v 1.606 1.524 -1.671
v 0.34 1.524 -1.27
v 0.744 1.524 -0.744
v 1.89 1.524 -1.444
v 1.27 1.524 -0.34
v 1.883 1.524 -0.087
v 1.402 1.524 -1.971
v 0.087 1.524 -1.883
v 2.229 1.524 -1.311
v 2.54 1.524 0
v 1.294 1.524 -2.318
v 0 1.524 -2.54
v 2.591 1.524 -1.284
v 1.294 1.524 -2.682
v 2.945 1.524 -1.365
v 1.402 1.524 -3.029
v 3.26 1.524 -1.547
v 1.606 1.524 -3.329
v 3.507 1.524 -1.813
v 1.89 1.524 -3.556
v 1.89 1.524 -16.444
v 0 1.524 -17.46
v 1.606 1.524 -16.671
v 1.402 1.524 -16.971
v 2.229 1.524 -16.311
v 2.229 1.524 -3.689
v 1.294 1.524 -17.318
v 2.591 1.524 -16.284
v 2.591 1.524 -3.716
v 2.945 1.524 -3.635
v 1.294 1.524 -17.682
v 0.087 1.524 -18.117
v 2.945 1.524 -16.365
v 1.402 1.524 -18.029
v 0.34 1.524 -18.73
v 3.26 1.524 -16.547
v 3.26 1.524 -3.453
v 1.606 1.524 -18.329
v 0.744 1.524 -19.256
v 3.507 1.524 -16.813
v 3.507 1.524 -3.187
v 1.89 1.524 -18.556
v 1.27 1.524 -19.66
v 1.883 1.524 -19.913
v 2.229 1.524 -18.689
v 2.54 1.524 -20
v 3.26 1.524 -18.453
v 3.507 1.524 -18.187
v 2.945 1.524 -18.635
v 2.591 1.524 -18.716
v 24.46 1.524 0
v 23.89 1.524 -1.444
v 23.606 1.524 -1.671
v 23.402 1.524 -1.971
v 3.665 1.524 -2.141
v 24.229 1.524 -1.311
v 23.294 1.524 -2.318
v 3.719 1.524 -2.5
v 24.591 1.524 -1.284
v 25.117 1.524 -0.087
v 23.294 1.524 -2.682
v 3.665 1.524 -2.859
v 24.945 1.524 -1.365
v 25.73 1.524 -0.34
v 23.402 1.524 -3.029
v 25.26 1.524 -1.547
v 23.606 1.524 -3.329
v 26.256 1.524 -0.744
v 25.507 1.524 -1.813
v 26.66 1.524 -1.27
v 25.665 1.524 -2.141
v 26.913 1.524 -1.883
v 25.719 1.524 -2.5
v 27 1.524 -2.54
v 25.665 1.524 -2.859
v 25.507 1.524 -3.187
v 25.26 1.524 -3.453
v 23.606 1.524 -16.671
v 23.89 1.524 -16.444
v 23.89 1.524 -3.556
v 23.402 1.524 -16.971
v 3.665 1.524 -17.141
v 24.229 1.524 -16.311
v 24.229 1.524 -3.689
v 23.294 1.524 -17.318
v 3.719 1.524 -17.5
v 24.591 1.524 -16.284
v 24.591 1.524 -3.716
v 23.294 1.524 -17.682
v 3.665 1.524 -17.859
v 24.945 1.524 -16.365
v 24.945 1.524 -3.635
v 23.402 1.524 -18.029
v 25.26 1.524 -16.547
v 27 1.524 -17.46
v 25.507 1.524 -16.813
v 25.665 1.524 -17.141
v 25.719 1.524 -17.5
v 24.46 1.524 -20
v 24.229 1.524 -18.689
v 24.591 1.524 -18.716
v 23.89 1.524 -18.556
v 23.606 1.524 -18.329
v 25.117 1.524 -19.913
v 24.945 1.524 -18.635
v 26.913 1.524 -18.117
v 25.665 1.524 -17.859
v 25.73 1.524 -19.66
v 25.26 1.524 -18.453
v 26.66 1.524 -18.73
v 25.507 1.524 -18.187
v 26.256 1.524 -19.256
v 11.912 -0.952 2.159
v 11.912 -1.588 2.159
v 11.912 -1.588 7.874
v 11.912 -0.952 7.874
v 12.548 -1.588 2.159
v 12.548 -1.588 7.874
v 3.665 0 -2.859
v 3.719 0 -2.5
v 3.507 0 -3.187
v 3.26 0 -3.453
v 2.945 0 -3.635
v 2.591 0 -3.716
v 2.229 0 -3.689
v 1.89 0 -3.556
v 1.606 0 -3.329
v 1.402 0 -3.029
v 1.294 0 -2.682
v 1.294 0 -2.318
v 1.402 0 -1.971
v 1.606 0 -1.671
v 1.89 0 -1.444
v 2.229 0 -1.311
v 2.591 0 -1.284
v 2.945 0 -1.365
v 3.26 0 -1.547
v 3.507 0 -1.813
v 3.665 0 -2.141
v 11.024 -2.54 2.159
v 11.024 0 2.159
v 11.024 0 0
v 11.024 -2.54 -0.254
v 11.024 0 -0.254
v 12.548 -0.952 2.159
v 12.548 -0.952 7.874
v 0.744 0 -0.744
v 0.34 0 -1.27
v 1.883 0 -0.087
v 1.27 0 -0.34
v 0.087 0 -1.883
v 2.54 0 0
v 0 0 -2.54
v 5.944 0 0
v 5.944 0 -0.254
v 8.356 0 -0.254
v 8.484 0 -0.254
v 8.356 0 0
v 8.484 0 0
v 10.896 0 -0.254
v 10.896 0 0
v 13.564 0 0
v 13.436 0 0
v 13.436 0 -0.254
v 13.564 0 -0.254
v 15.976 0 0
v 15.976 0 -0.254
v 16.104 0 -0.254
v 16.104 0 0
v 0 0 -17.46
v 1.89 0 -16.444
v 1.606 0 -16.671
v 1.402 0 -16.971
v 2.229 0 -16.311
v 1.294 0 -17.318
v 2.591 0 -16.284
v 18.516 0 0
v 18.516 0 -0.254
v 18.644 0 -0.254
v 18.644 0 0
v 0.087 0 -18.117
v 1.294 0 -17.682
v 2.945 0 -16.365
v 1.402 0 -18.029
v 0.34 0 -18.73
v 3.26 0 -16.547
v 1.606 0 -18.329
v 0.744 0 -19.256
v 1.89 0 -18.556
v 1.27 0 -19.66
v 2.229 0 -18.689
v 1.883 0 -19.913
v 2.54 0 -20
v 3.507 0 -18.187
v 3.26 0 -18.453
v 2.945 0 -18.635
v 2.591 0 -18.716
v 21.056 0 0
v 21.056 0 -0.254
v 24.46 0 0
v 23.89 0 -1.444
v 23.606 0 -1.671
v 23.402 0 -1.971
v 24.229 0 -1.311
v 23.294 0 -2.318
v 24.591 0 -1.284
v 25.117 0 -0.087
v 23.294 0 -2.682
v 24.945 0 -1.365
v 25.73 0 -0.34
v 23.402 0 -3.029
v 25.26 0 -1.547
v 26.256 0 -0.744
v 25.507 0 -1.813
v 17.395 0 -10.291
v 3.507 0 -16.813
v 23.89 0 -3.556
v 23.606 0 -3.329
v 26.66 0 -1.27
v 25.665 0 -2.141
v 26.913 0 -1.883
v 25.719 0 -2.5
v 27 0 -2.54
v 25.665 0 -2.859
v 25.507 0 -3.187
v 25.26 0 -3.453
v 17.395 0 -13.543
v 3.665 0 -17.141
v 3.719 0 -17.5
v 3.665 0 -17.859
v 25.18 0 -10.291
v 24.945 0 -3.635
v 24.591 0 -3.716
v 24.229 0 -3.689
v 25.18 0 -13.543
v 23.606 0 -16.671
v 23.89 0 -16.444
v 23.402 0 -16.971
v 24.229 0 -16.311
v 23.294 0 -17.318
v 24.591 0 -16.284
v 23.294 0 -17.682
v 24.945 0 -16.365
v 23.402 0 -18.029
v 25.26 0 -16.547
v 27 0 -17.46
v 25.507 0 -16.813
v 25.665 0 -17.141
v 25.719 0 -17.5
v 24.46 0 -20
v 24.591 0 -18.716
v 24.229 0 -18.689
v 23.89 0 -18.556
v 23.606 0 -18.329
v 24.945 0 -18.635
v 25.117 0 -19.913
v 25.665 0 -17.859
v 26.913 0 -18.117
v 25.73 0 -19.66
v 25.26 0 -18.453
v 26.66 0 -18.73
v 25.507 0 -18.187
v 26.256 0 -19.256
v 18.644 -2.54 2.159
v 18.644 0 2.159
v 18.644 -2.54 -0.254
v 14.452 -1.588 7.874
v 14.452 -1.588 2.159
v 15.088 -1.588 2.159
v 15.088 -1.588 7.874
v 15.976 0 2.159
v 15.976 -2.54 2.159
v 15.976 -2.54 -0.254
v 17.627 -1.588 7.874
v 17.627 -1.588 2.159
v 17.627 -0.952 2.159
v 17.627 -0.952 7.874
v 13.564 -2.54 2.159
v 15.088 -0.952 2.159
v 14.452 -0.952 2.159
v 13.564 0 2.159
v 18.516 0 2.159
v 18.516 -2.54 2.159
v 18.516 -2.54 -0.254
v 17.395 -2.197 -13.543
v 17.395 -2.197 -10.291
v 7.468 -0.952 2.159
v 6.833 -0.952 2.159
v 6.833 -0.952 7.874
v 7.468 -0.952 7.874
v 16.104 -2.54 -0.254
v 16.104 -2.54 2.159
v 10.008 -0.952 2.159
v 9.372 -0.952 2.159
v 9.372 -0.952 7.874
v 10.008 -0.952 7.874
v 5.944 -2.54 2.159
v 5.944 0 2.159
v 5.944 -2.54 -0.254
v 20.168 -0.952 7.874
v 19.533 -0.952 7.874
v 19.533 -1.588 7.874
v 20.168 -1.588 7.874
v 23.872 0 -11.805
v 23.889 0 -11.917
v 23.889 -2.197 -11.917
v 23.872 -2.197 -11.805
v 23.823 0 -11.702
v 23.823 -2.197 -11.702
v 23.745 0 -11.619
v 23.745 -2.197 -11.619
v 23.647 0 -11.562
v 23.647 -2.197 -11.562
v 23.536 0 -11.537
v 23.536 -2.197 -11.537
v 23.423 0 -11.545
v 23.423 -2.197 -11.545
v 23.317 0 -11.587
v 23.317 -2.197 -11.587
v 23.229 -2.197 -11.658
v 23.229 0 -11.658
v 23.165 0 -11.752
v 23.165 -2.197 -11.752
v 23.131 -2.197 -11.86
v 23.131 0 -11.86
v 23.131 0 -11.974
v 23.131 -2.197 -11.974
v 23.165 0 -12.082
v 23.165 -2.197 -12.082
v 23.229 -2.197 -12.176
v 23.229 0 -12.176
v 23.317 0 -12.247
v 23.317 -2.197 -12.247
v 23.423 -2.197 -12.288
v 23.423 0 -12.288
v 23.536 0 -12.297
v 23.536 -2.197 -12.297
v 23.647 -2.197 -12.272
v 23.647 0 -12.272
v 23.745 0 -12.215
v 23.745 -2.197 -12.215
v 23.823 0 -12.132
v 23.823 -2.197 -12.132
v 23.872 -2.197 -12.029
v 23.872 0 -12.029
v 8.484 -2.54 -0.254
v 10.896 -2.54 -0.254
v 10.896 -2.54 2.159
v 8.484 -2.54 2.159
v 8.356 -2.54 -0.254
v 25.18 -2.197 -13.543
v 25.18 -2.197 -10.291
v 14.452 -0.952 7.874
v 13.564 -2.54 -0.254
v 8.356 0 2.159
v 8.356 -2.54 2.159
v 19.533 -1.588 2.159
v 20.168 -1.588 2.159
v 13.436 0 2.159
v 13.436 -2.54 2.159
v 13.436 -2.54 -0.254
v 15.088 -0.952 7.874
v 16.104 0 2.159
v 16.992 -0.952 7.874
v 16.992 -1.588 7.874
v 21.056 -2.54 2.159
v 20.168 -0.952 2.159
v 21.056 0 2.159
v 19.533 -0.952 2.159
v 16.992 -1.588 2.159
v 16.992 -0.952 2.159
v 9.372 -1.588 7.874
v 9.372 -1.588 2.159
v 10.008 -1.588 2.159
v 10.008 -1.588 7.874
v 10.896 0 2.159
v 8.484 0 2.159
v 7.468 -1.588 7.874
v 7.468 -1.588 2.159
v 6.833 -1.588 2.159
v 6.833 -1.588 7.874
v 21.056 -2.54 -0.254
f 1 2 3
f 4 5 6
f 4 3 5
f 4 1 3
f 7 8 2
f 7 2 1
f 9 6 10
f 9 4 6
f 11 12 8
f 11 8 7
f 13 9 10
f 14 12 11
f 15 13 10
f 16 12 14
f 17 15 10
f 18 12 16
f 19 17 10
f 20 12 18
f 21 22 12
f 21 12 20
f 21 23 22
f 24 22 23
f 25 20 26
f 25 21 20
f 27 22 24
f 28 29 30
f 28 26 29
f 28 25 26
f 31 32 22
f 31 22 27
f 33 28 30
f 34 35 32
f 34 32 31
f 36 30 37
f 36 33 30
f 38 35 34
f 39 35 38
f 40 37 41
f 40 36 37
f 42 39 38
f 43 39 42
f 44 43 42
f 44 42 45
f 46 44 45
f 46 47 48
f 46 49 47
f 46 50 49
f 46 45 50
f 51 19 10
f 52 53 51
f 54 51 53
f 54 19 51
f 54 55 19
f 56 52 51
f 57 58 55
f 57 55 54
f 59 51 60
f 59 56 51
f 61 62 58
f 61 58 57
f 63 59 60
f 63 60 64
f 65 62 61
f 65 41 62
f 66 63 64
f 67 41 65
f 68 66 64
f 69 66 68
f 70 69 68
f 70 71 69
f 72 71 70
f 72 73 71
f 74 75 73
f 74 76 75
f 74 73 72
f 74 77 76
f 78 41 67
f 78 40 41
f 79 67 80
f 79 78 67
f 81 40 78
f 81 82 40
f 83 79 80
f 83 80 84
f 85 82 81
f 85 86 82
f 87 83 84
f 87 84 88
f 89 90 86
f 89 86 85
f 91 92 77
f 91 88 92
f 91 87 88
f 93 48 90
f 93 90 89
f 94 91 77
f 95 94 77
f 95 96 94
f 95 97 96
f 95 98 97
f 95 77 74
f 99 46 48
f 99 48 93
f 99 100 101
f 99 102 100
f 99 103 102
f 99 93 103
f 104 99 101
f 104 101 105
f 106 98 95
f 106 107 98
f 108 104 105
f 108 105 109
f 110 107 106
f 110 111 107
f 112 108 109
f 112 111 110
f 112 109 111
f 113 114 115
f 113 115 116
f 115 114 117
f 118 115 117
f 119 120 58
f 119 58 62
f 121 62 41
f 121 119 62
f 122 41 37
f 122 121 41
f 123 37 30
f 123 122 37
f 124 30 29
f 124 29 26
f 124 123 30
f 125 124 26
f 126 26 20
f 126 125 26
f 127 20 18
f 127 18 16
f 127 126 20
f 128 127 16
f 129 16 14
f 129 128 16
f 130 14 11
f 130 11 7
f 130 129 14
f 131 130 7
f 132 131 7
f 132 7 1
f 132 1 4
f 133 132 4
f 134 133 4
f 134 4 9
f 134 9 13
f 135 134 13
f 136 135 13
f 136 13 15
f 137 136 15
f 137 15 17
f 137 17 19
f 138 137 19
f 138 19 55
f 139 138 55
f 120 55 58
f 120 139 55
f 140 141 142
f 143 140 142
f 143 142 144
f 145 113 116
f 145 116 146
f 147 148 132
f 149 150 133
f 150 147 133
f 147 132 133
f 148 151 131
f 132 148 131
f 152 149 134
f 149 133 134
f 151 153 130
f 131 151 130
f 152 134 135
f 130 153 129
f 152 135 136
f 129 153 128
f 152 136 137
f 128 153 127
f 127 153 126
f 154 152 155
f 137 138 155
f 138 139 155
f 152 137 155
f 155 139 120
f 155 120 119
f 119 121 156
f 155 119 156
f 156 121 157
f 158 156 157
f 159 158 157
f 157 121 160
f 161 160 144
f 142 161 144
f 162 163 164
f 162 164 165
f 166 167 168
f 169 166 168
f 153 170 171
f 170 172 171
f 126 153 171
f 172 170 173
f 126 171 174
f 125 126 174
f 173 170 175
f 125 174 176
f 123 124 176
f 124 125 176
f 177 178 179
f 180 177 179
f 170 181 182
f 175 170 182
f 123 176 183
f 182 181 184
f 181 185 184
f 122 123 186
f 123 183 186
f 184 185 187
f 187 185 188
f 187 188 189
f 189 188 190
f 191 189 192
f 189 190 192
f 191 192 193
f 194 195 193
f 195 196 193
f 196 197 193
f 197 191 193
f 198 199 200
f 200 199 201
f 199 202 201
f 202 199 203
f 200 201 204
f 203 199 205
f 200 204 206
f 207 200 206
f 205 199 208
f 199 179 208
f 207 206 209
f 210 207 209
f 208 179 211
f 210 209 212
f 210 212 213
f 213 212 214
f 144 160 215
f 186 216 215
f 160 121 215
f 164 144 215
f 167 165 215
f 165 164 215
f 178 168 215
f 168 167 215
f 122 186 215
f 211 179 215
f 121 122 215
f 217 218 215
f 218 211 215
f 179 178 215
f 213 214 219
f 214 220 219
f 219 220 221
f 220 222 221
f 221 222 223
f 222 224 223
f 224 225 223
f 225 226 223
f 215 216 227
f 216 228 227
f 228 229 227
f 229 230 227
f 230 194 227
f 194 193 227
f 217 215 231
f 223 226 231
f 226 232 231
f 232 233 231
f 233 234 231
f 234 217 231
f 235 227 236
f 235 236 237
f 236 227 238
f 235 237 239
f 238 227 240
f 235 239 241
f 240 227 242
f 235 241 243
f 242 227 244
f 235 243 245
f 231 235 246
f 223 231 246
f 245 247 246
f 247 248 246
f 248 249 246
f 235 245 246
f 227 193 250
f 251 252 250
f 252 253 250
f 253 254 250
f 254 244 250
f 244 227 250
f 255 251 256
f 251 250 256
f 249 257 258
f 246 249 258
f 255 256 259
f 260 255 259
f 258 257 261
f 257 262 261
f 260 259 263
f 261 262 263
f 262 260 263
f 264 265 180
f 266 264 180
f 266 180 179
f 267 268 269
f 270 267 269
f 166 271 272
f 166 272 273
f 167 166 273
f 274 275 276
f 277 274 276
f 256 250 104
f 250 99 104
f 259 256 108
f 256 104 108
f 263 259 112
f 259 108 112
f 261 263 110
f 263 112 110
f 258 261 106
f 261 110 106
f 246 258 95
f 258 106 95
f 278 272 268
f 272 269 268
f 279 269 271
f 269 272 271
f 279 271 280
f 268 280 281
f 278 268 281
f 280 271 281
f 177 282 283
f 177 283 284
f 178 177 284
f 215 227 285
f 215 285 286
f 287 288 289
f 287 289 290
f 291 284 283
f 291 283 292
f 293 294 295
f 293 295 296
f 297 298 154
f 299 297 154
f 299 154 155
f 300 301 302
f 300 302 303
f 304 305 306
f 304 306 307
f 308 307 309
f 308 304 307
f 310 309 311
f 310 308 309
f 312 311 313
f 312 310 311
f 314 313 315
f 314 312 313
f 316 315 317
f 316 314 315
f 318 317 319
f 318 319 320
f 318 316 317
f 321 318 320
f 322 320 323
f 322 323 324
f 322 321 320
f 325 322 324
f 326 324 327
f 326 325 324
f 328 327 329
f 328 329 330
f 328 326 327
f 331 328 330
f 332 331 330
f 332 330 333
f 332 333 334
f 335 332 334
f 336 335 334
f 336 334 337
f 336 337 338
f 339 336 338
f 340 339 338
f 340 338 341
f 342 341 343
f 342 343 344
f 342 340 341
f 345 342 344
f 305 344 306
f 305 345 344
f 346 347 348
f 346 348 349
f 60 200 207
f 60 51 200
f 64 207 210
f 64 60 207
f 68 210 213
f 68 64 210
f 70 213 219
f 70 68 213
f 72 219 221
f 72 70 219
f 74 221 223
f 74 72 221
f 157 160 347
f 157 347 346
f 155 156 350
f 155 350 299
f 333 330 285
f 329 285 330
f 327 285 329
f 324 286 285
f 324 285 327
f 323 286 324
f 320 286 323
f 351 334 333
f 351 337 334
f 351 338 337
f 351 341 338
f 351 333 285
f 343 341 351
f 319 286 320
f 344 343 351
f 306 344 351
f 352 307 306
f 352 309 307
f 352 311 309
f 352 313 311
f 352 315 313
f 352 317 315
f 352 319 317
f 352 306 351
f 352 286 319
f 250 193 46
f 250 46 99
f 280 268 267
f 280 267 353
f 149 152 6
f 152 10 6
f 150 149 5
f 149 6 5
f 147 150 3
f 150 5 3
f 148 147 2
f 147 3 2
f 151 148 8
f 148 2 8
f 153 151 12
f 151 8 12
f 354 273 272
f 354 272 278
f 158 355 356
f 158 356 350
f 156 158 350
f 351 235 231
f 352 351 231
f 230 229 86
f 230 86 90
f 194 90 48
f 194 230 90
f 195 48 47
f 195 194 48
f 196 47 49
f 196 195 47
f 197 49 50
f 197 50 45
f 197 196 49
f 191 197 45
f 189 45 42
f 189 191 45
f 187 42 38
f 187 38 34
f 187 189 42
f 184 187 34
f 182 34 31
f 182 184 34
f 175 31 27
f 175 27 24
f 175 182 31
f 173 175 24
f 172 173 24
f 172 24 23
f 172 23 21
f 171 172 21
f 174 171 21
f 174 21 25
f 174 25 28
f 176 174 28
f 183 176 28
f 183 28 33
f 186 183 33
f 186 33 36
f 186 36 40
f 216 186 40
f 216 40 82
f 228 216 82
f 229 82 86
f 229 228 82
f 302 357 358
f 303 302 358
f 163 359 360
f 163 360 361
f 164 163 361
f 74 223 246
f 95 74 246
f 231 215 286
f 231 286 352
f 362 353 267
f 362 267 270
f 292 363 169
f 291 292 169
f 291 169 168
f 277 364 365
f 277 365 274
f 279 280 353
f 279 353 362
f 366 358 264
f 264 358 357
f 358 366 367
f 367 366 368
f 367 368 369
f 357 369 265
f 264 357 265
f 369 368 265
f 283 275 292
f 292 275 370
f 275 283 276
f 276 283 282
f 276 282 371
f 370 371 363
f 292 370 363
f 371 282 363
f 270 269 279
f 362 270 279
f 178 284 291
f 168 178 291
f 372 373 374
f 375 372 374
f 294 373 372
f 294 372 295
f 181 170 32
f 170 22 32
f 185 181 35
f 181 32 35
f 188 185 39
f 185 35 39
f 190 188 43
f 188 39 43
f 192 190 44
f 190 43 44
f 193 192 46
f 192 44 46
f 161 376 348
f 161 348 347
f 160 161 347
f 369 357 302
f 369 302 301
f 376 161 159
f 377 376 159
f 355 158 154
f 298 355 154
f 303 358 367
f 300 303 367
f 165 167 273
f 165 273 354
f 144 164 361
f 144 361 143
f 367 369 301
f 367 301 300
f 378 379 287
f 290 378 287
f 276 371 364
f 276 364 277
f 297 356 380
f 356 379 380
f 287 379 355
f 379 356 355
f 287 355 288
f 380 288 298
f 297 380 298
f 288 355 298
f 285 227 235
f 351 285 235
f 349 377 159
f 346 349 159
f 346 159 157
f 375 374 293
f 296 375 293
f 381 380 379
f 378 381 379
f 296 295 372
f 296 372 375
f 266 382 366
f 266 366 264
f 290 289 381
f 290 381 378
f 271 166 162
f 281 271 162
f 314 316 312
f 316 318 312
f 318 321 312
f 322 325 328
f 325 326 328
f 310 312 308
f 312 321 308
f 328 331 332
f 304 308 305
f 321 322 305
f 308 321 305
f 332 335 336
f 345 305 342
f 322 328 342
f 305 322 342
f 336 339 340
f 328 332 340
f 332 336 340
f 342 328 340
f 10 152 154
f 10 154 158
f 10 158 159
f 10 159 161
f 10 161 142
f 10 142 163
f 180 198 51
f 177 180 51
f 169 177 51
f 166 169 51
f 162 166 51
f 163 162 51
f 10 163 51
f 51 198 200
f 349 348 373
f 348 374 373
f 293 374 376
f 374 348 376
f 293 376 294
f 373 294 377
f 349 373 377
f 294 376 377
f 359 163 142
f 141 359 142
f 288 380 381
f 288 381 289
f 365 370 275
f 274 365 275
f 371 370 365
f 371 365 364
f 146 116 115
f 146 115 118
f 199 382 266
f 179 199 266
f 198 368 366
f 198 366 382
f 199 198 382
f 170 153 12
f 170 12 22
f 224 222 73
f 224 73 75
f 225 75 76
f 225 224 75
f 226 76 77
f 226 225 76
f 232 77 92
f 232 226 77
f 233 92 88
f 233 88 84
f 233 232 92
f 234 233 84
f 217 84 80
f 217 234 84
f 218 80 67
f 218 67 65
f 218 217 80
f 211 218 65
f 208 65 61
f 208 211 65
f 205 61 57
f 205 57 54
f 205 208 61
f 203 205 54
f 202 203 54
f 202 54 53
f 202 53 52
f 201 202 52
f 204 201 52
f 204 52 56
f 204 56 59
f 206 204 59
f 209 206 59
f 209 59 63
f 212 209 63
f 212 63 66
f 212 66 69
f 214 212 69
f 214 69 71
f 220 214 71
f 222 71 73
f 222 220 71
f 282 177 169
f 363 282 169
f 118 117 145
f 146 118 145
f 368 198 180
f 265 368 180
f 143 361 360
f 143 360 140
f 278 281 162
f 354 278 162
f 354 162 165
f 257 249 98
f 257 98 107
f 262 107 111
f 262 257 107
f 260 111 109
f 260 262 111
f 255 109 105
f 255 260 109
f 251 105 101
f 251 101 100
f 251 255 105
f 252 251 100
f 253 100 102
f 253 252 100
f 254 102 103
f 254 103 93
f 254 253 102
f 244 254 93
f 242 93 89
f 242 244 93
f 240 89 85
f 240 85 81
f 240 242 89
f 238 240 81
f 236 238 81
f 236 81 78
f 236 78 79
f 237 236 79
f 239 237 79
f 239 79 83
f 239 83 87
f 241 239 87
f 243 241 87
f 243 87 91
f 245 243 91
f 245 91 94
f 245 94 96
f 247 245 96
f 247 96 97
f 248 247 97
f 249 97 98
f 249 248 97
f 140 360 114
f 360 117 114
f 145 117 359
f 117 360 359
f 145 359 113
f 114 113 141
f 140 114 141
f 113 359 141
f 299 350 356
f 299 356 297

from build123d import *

# Parameters (mm, degrees)
SKETCH1_W           = 27
SKETCH1_H           = 20
SKETCH1_R           = 1.2192
BOSS_EXTRUDE1_DEPTH = 1.524
SKETCH3_W           = 2.413
SKETCH3_H           = 2.413
BOSS_EXTRUDE2_DEPTH = 2.54
SKETCH4_W           = 0.635
SKETCH4_H           = 0.635
BOSS_EXTRUDE3_DEPTH = 5.715
FILLET1_R           = 2.54
SKETCH5_W           = 7.7851
SKETCH5_H           = 3.2512
SKETCH5_R           = 0.381
BOSS_EXTRUDE4_DEPTH = 2.1971


with BuildPart() as part:
    # Sketch1 → Boss-Extrude1 (new body)
    with BuildSketch(Plane(origin=(0, 0, 0), x_dir=(1, 0, 0), z_dir=(0, 1, 0))):
        with Locations((13.5, 10)):
            Rectangle(SKETCH1_W, SKETCH1_H)
        with Locations((2.5, 17.5)):
            Circle(SKETCH1_R, mode=Mode.SUBTRACT)
        with Locations((24.5, 17.5)):
            Circle(SKETCH1_R, mode=Mode.SUBTRACT)
        with Locations((24.5, 2.5)):
            Circle(SKETCH1_R, mode=Mode.SUBTRACT)
        with Locations((2.5, 2.5)):
            Circle(SKETCH1_R, mode=Mode.SUBTRACT)
    extrude(amount=BOSS_EXTRUDE1_DEPTH)

    # Sketch3 → Boss-Extrude2 (add)
    with BuildSketch(Plane(origin=(0, 0, 0), x_dir=(-1, 0, 0), z_dir=(0, -1, 0))):
        with Locations((-19.85, -0.9525)):
            Rectangle(SKETCH3_W, SKETCH3_H)
        with Locations((-14.77, -0.9525)):
            Rectangle(SKETCH3_W, SKETCH3_H)
        with Locations((-12.23, -0.9525)):
            Rectangle(SKETCH3_W, SKETCH3_H)
        with Locations((-9.69, -0.9525)):
            Rectangle(SKETCH3_W, SKETCH3_H)
        with Locations((-7.15, -0.9525)):
            Rectangle(SKETCH3_W, SKETCH3_H)
        with Locations((-17.31, -0.9525)):
            Rectangle(SKETCH3_W, SKETCH3_H)
    extrude(amount=BOSS_EXTRUDE2_DEPTH)

    # Sketch4 → Boss-Extrude3 (add)
    with BuildSketch(Plane.XY.offset(2.159)):
        with Locations((17.31, -1.27)):
            Rectangle(SKETCH4_W, SKETCH4_H)
        with Locations((7.15, -1.27)):
            Rectangle(SKETCH4_W, SKETCH4_H)
        with Locations((9.69, -1.27)):
            Rectangle(SKETCH4_W, SKETCH4_H)
        with Locations((12.23, -1.27)):
            Rectangle(SKETCH4_W, SKETCH4_H)
        with Locations((14.77, -1.27)):
            Rectangle(SKETCH4_W, SKETCH4_H)
        with Locations((19.85, -1.27)):
            Rectangle(SKETCH4_W, SKETCH4_H)
    extrude(amount=BOSS_EXTRUDE3_DEPTH)

    # Fillet1
    fillet1_edges = [part.edges().sort_by_distance(p)[0] for p in [
        (0, 0.762, -20),
        (27, 0.762, -20),
        (27, 0.762, 0),
        (0, 0.762, 0),
    ]]
    fillet(fillet1_edges, radius=FILLET1_R)

    # Sketch5 → Boss-Extrude4 (add)
    with BuildSketch(Plane.XZ):
        with Locations((21.287352133, -11.916943925)):
            Rectangle(SKETCH5_W, SKETCH5_H)
        with Locations((23.50781589, -11.916943925)):
            Circle(SKETCH5_R, mode=Mode.SUBTRACT)
    extrude(amount=BOSS_EXTRUDE4_DEPTH)


solid = part.part
